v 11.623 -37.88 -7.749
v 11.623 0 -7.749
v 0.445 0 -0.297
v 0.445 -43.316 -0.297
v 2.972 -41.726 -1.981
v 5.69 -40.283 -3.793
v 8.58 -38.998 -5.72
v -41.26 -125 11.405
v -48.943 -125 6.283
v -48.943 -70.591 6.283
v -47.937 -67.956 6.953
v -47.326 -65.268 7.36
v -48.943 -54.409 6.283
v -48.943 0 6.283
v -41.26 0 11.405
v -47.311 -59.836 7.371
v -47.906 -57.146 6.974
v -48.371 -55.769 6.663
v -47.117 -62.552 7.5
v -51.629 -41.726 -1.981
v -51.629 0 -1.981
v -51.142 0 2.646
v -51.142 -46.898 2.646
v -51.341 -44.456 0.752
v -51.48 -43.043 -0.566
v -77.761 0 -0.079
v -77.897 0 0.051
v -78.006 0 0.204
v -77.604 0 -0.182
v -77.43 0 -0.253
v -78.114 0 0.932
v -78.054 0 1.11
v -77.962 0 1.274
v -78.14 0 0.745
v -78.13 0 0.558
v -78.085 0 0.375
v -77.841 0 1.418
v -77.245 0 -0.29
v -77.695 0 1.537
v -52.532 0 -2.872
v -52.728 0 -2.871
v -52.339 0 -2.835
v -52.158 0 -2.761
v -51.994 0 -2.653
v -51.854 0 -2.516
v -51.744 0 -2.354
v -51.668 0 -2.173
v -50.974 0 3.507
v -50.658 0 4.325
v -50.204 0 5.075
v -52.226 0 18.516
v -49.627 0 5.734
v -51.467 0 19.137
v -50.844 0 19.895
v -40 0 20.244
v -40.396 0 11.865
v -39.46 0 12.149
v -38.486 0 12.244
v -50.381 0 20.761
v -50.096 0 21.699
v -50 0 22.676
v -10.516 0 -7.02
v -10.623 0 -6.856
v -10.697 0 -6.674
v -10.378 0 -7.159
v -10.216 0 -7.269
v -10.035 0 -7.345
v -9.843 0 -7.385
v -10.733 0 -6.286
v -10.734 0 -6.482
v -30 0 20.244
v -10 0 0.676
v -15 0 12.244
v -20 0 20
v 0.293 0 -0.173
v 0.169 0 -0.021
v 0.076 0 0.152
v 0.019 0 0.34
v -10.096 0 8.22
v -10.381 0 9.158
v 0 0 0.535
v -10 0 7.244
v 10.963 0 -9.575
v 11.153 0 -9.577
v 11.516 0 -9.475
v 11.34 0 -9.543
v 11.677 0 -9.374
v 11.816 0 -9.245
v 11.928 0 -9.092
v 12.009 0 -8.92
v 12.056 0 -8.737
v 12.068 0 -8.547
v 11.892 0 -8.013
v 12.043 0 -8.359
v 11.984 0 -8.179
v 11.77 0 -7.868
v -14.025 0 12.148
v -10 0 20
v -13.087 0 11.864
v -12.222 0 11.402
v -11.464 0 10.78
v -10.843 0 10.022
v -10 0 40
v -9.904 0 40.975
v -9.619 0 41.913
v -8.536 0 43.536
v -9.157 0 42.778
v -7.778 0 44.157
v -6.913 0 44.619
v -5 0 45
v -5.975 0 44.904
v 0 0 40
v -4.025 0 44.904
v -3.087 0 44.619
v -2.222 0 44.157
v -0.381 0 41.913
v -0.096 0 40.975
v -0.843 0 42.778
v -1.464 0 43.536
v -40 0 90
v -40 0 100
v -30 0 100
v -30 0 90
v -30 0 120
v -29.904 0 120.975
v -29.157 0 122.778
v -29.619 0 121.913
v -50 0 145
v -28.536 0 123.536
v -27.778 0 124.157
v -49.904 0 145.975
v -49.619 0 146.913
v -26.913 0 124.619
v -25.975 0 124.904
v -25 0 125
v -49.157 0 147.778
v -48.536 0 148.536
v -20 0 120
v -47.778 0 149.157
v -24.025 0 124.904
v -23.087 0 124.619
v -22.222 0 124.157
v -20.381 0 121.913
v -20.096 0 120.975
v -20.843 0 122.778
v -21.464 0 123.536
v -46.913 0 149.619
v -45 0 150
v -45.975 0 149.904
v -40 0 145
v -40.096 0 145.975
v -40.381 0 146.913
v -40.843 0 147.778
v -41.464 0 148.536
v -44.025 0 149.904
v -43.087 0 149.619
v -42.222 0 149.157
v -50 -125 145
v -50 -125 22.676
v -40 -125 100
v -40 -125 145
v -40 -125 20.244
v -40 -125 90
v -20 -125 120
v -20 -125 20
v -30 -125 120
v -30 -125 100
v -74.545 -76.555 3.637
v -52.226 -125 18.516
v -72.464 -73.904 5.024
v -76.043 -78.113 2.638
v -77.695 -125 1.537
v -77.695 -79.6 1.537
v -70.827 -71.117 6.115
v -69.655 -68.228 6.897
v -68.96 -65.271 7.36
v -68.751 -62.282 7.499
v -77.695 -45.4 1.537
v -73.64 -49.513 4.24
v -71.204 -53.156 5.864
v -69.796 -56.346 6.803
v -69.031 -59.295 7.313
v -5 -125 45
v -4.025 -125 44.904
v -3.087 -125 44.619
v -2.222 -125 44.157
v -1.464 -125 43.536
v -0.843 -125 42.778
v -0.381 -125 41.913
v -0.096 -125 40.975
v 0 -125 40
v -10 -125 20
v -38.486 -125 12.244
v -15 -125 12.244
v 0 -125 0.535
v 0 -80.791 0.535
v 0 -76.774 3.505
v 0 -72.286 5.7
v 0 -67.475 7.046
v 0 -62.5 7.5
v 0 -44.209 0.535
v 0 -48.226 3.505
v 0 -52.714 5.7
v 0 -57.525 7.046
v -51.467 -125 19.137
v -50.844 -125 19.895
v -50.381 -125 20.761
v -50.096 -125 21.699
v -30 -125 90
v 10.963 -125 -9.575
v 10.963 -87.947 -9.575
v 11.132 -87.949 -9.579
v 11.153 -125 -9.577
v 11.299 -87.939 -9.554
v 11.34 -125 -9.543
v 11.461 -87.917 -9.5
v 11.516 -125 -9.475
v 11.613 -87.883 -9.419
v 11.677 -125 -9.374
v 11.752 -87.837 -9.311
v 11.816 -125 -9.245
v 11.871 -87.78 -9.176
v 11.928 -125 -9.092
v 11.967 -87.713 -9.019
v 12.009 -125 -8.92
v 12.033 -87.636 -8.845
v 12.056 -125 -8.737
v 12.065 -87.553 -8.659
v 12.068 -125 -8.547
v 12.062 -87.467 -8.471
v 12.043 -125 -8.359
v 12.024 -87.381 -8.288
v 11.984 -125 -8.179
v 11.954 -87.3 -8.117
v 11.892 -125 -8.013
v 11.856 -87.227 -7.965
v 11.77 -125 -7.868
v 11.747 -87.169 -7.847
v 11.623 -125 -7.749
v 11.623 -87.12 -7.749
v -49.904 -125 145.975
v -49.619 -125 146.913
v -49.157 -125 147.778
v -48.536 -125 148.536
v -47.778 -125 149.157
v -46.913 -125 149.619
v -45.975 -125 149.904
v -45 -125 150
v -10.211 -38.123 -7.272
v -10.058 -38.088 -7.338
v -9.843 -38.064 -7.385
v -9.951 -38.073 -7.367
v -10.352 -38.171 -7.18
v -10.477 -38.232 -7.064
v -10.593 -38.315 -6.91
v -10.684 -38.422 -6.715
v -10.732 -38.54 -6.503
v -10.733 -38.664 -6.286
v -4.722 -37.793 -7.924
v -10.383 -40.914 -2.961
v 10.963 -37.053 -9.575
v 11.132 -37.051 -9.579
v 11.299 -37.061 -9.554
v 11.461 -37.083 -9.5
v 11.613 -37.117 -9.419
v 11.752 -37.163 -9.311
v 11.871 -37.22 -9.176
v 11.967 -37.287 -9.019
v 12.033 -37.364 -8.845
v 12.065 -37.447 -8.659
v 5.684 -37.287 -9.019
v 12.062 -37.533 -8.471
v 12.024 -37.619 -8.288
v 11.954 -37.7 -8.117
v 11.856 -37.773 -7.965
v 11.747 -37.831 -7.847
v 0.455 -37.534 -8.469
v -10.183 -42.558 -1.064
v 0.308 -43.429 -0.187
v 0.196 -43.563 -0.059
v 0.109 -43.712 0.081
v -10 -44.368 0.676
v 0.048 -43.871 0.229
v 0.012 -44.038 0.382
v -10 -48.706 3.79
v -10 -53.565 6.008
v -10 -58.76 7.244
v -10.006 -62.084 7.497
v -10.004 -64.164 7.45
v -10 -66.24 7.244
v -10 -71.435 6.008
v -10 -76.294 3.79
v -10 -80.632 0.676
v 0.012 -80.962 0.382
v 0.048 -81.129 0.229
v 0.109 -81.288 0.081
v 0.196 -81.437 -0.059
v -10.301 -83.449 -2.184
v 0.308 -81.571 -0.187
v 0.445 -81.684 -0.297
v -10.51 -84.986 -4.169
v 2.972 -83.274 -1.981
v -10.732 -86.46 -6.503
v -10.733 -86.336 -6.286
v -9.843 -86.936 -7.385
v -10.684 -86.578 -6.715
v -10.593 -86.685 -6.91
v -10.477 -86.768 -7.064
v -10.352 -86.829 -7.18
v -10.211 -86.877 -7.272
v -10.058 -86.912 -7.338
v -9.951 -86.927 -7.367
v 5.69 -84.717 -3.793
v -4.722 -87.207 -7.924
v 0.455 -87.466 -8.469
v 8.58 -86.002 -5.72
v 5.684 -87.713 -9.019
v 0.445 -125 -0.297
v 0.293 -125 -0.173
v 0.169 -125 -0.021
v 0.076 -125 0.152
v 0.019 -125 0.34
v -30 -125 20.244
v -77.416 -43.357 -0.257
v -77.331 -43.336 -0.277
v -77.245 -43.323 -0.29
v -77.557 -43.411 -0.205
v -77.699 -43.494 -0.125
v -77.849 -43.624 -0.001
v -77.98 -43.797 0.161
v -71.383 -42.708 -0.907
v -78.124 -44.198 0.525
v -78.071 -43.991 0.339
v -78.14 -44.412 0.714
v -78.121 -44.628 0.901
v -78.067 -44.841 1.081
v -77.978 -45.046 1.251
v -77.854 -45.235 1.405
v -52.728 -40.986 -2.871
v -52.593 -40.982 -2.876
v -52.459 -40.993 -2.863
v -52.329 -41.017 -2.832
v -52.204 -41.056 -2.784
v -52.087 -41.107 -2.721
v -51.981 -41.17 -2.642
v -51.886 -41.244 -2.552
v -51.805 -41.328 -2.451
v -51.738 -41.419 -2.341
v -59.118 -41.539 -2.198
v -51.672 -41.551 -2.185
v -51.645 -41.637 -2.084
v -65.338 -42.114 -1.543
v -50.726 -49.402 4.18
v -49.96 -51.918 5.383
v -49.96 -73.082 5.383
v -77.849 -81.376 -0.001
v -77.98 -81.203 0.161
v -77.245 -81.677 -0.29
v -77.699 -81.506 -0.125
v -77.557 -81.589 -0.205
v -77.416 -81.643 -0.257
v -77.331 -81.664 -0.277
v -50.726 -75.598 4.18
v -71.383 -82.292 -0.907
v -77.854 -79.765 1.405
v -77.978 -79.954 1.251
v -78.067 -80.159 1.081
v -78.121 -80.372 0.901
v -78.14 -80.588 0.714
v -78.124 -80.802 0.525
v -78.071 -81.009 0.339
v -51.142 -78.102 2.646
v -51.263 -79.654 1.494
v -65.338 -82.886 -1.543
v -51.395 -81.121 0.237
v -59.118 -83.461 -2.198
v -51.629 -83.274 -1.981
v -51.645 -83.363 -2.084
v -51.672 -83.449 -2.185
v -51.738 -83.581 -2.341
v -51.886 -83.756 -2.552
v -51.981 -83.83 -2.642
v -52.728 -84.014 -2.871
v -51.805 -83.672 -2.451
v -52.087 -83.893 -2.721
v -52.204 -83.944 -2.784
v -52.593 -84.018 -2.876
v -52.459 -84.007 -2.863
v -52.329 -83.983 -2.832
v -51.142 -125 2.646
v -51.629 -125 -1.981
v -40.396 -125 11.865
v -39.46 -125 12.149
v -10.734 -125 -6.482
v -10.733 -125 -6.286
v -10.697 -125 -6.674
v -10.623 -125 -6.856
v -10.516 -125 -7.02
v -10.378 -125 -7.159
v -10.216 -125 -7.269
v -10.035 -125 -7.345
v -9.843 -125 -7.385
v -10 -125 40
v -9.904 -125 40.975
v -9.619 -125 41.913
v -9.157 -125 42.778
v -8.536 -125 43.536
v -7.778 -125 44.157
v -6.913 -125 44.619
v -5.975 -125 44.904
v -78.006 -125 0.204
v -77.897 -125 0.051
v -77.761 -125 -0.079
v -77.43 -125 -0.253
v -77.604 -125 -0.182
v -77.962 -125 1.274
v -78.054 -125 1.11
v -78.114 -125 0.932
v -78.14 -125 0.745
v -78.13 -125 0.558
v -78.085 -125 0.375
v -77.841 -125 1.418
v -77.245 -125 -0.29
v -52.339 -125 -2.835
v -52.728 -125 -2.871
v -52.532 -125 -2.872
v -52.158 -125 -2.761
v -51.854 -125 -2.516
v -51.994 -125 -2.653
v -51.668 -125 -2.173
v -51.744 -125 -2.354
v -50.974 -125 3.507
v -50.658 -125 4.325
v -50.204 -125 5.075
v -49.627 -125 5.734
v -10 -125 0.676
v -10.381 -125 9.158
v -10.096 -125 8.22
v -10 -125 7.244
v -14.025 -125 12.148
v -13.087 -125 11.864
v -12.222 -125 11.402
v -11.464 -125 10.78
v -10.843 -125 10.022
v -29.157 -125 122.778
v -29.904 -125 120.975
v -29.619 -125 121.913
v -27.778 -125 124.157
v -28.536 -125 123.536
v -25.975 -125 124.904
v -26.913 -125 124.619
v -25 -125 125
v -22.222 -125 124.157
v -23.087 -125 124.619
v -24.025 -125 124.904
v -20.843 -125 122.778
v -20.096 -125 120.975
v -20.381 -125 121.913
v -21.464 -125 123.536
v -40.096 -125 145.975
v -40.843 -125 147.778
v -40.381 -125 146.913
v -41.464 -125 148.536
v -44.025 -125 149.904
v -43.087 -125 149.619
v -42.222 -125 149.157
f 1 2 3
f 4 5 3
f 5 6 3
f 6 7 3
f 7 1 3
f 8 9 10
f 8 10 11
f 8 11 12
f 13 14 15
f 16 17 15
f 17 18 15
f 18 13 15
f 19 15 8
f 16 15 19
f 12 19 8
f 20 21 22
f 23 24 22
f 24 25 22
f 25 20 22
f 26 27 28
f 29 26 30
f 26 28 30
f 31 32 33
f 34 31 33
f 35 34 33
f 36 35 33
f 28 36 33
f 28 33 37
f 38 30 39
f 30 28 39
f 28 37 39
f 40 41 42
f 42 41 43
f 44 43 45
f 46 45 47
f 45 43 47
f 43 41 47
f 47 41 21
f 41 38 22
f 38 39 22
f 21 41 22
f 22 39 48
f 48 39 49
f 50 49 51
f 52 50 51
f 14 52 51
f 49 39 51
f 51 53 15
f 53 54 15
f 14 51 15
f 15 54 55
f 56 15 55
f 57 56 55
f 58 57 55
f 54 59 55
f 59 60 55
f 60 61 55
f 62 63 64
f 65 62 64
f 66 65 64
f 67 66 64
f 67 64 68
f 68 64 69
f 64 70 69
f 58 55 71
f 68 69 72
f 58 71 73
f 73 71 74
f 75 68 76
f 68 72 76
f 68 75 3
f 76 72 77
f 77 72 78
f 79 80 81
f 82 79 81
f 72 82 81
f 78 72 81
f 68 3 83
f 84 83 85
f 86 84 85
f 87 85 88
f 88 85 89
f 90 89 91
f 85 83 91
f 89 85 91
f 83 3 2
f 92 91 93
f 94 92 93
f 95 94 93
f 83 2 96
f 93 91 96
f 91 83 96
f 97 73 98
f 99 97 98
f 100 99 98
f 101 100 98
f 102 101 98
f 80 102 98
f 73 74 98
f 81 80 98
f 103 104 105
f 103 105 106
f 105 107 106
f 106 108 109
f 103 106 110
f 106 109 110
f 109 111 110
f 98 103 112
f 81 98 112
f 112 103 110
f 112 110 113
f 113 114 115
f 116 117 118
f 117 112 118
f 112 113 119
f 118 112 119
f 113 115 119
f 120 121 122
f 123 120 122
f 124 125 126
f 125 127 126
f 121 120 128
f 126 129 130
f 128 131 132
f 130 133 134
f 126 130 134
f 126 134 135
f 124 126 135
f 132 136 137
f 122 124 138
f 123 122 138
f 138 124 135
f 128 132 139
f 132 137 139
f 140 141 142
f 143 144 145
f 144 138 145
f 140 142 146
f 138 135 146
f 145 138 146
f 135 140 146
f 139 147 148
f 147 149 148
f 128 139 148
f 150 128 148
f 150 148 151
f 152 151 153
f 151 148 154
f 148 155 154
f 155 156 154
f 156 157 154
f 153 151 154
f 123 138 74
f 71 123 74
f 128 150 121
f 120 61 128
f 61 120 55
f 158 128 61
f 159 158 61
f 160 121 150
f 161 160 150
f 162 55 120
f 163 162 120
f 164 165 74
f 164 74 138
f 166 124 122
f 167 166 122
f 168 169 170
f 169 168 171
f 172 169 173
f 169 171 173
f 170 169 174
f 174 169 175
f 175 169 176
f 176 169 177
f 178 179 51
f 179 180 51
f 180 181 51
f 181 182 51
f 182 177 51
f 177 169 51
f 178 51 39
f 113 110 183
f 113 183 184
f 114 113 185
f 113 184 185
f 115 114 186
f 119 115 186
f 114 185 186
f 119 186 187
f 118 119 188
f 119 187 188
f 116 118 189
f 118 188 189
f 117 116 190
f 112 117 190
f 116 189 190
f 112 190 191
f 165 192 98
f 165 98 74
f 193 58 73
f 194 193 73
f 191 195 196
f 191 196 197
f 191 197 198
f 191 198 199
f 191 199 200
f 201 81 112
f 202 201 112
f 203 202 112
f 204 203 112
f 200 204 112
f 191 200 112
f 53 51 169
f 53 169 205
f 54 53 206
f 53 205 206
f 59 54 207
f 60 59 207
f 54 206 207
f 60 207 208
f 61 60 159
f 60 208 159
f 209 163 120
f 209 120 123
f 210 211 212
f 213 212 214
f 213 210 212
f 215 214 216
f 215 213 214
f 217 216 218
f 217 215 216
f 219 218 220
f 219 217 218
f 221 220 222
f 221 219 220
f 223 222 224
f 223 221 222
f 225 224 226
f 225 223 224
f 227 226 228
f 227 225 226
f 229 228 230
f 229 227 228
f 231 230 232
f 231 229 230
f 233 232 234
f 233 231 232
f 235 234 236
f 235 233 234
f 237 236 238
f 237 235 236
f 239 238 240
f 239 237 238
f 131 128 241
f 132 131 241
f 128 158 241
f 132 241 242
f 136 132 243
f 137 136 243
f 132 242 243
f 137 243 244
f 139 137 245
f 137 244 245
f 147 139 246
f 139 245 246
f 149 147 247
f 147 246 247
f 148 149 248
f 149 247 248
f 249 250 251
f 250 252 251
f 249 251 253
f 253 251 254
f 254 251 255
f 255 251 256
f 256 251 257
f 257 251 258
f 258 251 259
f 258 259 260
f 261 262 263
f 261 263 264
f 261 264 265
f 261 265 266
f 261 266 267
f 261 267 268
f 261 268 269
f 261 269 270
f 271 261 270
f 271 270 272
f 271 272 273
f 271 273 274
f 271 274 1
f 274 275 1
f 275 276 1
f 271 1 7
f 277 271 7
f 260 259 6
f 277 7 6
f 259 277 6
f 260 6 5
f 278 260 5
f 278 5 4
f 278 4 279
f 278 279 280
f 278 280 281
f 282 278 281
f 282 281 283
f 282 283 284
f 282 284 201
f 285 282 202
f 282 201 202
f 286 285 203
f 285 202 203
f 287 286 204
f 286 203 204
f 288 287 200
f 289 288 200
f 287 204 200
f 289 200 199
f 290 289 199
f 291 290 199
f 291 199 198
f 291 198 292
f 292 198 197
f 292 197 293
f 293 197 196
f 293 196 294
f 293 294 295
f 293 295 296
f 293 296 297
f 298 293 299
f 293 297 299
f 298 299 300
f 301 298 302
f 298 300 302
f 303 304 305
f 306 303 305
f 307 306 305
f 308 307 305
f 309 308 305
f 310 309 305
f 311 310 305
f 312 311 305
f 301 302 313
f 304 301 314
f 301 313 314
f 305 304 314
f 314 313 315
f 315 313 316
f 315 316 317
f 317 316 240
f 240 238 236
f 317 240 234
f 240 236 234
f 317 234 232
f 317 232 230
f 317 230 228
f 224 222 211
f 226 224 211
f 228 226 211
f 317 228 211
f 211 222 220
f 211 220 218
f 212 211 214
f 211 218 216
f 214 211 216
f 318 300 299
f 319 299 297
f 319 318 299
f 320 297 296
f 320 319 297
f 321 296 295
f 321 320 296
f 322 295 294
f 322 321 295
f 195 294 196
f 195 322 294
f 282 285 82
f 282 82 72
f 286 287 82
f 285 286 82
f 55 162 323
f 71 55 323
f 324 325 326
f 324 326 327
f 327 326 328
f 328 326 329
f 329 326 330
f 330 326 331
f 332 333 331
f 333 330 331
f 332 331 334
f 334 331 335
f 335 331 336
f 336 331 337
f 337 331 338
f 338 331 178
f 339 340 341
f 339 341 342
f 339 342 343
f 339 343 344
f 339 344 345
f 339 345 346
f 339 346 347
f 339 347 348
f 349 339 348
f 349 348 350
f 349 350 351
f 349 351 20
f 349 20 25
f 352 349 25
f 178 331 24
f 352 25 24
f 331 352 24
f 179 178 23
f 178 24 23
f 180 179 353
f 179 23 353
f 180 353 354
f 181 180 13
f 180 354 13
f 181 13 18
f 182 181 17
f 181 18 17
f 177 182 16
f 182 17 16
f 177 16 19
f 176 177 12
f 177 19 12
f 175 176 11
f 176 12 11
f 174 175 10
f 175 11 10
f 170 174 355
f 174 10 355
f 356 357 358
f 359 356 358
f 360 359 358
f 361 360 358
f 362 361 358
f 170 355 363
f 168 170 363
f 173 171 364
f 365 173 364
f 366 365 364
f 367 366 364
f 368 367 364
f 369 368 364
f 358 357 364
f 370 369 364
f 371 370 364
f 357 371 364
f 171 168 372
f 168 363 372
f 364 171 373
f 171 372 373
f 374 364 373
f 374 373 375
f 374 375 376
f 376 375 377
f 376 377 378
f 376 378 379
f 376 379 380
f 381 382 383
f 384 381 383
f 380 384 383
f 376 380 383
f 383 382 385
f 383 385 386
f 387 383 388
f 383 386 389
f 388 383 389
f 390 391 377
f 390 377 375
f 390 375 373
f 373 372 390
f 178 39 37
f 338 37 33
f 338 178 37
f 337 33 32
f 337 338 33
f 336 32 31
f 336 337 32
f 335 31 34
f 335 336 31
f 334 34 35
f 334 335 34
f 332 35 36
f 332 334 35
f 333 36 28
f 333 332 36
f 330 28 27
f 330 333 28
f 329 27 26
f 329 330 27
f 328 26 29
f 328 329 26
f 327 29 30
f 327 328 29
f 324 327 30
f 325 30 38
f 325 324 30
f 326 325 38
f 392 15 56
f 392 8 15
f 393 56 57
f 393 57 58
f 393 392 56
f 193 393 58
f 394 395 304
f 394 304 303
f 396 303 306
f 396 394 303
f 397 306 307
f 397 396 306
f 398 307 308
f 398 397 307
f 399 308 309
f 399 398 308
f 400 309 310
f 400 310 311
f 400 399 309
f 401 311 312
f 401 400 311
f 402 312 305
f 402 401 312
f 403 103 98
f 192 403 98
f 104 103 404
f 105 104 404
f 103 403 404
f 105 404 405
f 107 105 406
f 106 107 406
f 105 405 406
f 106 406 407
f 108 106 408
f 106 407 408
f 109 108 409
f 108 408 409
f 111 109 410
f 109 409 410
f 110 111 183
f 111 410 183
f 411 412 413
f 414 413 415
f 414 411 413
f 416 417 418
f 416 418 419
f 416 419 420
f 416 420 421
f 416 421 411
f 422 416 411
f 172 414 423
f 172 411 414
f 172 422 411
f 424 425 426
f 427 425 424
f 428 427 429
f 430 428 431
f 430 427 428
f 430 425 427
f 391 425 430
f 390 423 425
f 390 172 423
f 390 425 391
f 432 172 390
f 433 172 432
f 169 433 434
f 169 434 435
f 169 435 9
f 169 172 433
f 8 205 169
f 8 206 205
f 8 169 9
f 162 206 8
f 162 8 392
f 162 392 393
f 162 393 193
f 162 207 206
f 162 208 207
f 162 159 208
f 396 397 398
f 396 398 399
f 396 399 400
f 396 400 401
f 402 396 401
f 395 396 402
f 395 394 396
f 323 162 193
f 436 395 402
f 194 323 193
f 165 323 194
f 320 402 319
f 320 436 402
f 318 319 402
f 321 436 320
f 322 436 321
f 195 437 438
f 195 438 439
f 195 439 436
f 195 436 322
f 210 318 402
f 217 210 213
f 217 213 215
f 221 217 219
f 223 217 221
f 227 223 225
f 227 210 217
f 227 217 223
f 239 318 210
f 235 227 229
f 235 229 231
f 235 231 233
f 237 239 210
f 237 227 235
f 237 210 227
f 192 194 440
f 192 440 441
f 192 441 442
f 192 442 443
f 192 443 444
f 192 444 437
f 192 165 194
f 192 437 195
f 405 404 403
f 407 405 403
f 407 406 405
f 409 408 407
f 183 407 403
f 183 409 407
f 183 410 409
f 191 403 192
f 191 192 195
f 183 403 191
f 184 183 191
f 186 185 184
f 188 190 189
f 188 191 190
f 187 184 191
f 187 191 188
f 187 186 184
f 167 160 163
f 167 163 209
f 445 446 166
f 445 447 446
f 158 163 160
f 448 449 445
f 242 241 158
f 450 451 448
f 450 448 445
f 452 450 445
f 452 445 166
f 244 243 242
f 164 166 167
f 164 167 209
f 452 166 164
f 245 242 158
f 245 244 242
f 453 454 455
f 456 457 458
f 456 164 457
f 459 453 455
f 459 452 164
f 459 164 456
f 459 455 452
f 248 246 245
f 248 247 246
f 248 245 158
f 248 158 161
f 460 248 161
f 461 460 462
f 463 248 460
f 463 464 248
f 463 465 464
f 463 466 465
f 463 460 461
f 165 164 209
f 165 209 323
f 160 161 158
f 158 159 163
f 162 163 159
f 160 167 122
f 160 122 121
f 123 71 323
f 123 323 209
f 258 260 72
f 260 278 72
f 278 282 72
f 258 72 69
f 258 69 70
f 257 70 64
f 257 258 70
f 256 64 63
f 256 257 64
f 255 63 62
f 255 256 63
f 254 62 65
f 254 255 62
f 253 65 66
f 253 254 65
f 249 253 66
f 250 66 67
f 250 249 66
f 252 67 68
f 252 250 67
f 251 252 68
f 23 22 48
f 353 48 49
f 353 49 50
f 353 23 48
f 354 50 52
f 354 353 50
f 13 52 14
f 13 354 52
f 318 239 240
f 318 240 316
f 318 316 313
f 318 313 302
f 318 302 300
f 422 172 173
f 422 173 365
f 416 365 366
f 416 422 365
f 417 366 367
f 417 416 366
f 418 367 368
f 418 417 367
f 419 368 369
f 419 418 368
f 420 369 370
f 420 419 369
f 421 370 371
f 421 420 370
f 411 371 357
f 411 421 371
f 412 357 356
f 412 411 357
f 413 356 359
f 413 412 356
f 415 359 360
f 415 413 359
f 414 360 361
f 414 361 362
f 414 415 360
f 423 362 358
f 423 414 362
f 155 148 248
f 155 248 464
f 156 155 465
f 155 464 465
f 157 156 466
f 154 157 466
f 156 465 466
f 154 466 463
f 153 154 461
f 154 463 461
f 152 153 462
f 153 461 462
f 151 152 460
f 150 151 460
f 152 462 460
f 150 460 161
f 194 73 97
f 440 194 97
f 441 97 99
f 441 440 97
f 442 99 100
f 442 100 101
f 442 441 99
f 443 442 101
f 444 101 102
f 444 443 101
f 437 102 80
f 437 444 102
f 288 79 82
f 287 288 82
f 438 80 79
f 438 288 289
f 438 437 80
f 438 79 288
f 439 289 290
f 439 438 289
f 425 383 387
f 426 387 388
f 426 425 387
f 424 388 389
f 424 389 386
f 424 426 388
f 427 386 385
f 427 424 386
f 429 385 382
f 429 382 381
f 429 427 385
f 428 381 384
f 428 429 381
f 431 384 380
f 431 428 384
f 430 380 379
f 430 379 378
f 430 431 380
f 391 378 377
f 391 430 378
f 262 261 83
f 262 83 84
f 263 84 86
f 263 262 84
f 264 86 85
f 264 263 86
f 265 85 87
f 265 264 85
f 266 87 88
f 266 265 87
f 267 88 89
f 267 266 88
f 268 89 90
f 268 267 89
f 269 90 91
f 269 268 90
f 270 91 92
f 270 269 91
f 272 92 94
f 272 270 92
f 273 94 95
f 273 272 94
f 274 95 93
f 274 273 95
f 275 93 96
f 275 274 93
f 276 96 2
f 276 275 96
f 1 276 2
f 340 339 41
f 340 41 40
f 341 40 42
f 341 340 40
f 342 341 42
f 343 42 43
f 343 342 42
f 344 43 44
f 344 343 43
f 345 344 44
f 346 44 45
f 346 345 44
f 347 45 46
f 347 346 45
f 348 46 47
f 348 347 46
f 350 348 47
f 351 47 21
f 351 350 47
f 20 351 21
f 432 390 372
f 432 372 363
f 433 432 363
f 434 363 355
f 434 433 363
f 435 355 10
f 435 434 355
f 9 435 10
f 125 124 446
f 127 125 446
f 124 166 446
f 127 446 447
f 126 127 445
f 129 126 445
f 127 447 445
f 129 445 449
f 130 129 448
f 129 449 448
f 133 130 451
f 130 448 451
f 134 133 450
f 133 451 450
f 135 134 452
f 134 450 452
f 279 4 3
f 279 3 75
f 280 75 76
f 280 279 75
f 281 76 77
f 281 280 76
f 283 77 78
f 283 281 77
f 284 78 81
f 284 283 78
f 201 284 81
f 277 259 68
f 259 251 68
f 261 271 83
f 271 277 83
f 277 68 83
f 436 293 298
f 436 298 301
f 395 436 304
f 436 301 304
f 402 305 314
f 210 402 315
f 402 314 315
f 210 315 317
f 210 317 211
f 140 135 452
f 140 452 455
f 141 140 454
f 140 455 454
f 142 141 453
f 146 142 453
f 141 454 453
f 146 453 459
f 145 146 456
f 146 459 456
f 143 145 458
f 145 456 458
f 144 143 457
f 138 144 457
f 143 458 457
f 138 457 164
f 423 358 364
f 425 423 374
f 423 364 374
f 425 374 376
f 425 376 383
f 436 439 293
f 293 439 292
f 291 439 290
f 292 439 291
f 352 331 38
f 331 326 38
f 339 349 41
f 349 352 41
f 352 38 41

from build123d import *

# Parameters (mm, degrees)
F0_W     = 10
F0_H     = 69.7555384352
F1_DEPTH = 125
F2_R     = 1
F3_R     = 4.99999
F5_R     = 5
F6_R     = 5
F8_R     = 27.5
F9_DEPTH = 128.1414455964


# Not quite as in the source:
# - two fillets or chamfers of one size are made in one step
# - a fillet or chamfer is up to 0.001 mm smaller than in the source, because OpenCascade refuses the exact size


with BuildPart() as f1:
    # F0 (on Front) → F1 (new body)
    with BuildSketch(Plane.XZ):
        Polygon((-50, 150), (-50, 20), (-80, 0), (-51.7332726626, -2.9754449829), (-50.8957943865, 4.9805986405), (-40, 12.2444615648), (-30, 12.2444615648), (-10, 12.2444615648), (-10, 10), (-10, 0.6757781788), (-10.8374782761, -7.2802654446), (15, -10), (0, 0), (0, 45), (-10, 45), (-10, 20), (-20, 20), (-20, 125), (-30, 125), (-30, 100), (-40, 100), (-40, 150), align=None)
        with Locations((-35, 55.1222307824)):
            Rectangle(F0_W, F0_H, mode=Mode.SUBTRACT)
    extrude(amount=F1_DEPTH)

    # F2
    f2_edges = [f1.edges().sort_by_distance(p)[0] for p in [
        (-80, -62.5, 0),
        (-10.837478, -62.5, -7.280265),
        (15, -62.5, -10),
        (-51.733273, -62.5, -2.975445),
        (0, -62.5, 0),
    ]]
    fillet(f2_edges, radius=F2_R)

    # F3 (radius 5 in the source; OpenCascade refuses exactly that, so slightly less here)
    f3_edges = [f1.edges().sort_by_distance(p)[0] for p in [
        (0, -62.5, 45),
        (-10, -62.5, 45),
        (-20, -62.5, 125),
        (-30, -62.5, 125),
        (-40, -62.5, 150),
        (-50, -62.5, 150),
    ]]
    fillet(f3_edges, radius=F3_R)

    # F5
    f5_edges = [f1.edges().sort_by_distance(p)[0] for p in [
        (-50.895794, -62.5, 4.980599),
        (-40, -62.5, 12.244462),
        (-10, -62.5, 12.244462),
    ]]
    fillet(f5_edges, radius=F5_R)

    # F6
    f6_edges = [f1.edges().sort_by_distance(p)[0] for p in [
        (-50, -62.5, 20),
    ]]
    fillet(f6_edges, radius=F6_R)

    # F8 (on offset) → F9 (cut, through all)
    with BuildSketch(Plane.YZ.offset(50)):
        with Locations((-62.5, -20)):
            Circle(F8_R)
    extrude(amount=-F9_DEPTH, mode=Mode.SUBTRACT)


solid = f1.part
